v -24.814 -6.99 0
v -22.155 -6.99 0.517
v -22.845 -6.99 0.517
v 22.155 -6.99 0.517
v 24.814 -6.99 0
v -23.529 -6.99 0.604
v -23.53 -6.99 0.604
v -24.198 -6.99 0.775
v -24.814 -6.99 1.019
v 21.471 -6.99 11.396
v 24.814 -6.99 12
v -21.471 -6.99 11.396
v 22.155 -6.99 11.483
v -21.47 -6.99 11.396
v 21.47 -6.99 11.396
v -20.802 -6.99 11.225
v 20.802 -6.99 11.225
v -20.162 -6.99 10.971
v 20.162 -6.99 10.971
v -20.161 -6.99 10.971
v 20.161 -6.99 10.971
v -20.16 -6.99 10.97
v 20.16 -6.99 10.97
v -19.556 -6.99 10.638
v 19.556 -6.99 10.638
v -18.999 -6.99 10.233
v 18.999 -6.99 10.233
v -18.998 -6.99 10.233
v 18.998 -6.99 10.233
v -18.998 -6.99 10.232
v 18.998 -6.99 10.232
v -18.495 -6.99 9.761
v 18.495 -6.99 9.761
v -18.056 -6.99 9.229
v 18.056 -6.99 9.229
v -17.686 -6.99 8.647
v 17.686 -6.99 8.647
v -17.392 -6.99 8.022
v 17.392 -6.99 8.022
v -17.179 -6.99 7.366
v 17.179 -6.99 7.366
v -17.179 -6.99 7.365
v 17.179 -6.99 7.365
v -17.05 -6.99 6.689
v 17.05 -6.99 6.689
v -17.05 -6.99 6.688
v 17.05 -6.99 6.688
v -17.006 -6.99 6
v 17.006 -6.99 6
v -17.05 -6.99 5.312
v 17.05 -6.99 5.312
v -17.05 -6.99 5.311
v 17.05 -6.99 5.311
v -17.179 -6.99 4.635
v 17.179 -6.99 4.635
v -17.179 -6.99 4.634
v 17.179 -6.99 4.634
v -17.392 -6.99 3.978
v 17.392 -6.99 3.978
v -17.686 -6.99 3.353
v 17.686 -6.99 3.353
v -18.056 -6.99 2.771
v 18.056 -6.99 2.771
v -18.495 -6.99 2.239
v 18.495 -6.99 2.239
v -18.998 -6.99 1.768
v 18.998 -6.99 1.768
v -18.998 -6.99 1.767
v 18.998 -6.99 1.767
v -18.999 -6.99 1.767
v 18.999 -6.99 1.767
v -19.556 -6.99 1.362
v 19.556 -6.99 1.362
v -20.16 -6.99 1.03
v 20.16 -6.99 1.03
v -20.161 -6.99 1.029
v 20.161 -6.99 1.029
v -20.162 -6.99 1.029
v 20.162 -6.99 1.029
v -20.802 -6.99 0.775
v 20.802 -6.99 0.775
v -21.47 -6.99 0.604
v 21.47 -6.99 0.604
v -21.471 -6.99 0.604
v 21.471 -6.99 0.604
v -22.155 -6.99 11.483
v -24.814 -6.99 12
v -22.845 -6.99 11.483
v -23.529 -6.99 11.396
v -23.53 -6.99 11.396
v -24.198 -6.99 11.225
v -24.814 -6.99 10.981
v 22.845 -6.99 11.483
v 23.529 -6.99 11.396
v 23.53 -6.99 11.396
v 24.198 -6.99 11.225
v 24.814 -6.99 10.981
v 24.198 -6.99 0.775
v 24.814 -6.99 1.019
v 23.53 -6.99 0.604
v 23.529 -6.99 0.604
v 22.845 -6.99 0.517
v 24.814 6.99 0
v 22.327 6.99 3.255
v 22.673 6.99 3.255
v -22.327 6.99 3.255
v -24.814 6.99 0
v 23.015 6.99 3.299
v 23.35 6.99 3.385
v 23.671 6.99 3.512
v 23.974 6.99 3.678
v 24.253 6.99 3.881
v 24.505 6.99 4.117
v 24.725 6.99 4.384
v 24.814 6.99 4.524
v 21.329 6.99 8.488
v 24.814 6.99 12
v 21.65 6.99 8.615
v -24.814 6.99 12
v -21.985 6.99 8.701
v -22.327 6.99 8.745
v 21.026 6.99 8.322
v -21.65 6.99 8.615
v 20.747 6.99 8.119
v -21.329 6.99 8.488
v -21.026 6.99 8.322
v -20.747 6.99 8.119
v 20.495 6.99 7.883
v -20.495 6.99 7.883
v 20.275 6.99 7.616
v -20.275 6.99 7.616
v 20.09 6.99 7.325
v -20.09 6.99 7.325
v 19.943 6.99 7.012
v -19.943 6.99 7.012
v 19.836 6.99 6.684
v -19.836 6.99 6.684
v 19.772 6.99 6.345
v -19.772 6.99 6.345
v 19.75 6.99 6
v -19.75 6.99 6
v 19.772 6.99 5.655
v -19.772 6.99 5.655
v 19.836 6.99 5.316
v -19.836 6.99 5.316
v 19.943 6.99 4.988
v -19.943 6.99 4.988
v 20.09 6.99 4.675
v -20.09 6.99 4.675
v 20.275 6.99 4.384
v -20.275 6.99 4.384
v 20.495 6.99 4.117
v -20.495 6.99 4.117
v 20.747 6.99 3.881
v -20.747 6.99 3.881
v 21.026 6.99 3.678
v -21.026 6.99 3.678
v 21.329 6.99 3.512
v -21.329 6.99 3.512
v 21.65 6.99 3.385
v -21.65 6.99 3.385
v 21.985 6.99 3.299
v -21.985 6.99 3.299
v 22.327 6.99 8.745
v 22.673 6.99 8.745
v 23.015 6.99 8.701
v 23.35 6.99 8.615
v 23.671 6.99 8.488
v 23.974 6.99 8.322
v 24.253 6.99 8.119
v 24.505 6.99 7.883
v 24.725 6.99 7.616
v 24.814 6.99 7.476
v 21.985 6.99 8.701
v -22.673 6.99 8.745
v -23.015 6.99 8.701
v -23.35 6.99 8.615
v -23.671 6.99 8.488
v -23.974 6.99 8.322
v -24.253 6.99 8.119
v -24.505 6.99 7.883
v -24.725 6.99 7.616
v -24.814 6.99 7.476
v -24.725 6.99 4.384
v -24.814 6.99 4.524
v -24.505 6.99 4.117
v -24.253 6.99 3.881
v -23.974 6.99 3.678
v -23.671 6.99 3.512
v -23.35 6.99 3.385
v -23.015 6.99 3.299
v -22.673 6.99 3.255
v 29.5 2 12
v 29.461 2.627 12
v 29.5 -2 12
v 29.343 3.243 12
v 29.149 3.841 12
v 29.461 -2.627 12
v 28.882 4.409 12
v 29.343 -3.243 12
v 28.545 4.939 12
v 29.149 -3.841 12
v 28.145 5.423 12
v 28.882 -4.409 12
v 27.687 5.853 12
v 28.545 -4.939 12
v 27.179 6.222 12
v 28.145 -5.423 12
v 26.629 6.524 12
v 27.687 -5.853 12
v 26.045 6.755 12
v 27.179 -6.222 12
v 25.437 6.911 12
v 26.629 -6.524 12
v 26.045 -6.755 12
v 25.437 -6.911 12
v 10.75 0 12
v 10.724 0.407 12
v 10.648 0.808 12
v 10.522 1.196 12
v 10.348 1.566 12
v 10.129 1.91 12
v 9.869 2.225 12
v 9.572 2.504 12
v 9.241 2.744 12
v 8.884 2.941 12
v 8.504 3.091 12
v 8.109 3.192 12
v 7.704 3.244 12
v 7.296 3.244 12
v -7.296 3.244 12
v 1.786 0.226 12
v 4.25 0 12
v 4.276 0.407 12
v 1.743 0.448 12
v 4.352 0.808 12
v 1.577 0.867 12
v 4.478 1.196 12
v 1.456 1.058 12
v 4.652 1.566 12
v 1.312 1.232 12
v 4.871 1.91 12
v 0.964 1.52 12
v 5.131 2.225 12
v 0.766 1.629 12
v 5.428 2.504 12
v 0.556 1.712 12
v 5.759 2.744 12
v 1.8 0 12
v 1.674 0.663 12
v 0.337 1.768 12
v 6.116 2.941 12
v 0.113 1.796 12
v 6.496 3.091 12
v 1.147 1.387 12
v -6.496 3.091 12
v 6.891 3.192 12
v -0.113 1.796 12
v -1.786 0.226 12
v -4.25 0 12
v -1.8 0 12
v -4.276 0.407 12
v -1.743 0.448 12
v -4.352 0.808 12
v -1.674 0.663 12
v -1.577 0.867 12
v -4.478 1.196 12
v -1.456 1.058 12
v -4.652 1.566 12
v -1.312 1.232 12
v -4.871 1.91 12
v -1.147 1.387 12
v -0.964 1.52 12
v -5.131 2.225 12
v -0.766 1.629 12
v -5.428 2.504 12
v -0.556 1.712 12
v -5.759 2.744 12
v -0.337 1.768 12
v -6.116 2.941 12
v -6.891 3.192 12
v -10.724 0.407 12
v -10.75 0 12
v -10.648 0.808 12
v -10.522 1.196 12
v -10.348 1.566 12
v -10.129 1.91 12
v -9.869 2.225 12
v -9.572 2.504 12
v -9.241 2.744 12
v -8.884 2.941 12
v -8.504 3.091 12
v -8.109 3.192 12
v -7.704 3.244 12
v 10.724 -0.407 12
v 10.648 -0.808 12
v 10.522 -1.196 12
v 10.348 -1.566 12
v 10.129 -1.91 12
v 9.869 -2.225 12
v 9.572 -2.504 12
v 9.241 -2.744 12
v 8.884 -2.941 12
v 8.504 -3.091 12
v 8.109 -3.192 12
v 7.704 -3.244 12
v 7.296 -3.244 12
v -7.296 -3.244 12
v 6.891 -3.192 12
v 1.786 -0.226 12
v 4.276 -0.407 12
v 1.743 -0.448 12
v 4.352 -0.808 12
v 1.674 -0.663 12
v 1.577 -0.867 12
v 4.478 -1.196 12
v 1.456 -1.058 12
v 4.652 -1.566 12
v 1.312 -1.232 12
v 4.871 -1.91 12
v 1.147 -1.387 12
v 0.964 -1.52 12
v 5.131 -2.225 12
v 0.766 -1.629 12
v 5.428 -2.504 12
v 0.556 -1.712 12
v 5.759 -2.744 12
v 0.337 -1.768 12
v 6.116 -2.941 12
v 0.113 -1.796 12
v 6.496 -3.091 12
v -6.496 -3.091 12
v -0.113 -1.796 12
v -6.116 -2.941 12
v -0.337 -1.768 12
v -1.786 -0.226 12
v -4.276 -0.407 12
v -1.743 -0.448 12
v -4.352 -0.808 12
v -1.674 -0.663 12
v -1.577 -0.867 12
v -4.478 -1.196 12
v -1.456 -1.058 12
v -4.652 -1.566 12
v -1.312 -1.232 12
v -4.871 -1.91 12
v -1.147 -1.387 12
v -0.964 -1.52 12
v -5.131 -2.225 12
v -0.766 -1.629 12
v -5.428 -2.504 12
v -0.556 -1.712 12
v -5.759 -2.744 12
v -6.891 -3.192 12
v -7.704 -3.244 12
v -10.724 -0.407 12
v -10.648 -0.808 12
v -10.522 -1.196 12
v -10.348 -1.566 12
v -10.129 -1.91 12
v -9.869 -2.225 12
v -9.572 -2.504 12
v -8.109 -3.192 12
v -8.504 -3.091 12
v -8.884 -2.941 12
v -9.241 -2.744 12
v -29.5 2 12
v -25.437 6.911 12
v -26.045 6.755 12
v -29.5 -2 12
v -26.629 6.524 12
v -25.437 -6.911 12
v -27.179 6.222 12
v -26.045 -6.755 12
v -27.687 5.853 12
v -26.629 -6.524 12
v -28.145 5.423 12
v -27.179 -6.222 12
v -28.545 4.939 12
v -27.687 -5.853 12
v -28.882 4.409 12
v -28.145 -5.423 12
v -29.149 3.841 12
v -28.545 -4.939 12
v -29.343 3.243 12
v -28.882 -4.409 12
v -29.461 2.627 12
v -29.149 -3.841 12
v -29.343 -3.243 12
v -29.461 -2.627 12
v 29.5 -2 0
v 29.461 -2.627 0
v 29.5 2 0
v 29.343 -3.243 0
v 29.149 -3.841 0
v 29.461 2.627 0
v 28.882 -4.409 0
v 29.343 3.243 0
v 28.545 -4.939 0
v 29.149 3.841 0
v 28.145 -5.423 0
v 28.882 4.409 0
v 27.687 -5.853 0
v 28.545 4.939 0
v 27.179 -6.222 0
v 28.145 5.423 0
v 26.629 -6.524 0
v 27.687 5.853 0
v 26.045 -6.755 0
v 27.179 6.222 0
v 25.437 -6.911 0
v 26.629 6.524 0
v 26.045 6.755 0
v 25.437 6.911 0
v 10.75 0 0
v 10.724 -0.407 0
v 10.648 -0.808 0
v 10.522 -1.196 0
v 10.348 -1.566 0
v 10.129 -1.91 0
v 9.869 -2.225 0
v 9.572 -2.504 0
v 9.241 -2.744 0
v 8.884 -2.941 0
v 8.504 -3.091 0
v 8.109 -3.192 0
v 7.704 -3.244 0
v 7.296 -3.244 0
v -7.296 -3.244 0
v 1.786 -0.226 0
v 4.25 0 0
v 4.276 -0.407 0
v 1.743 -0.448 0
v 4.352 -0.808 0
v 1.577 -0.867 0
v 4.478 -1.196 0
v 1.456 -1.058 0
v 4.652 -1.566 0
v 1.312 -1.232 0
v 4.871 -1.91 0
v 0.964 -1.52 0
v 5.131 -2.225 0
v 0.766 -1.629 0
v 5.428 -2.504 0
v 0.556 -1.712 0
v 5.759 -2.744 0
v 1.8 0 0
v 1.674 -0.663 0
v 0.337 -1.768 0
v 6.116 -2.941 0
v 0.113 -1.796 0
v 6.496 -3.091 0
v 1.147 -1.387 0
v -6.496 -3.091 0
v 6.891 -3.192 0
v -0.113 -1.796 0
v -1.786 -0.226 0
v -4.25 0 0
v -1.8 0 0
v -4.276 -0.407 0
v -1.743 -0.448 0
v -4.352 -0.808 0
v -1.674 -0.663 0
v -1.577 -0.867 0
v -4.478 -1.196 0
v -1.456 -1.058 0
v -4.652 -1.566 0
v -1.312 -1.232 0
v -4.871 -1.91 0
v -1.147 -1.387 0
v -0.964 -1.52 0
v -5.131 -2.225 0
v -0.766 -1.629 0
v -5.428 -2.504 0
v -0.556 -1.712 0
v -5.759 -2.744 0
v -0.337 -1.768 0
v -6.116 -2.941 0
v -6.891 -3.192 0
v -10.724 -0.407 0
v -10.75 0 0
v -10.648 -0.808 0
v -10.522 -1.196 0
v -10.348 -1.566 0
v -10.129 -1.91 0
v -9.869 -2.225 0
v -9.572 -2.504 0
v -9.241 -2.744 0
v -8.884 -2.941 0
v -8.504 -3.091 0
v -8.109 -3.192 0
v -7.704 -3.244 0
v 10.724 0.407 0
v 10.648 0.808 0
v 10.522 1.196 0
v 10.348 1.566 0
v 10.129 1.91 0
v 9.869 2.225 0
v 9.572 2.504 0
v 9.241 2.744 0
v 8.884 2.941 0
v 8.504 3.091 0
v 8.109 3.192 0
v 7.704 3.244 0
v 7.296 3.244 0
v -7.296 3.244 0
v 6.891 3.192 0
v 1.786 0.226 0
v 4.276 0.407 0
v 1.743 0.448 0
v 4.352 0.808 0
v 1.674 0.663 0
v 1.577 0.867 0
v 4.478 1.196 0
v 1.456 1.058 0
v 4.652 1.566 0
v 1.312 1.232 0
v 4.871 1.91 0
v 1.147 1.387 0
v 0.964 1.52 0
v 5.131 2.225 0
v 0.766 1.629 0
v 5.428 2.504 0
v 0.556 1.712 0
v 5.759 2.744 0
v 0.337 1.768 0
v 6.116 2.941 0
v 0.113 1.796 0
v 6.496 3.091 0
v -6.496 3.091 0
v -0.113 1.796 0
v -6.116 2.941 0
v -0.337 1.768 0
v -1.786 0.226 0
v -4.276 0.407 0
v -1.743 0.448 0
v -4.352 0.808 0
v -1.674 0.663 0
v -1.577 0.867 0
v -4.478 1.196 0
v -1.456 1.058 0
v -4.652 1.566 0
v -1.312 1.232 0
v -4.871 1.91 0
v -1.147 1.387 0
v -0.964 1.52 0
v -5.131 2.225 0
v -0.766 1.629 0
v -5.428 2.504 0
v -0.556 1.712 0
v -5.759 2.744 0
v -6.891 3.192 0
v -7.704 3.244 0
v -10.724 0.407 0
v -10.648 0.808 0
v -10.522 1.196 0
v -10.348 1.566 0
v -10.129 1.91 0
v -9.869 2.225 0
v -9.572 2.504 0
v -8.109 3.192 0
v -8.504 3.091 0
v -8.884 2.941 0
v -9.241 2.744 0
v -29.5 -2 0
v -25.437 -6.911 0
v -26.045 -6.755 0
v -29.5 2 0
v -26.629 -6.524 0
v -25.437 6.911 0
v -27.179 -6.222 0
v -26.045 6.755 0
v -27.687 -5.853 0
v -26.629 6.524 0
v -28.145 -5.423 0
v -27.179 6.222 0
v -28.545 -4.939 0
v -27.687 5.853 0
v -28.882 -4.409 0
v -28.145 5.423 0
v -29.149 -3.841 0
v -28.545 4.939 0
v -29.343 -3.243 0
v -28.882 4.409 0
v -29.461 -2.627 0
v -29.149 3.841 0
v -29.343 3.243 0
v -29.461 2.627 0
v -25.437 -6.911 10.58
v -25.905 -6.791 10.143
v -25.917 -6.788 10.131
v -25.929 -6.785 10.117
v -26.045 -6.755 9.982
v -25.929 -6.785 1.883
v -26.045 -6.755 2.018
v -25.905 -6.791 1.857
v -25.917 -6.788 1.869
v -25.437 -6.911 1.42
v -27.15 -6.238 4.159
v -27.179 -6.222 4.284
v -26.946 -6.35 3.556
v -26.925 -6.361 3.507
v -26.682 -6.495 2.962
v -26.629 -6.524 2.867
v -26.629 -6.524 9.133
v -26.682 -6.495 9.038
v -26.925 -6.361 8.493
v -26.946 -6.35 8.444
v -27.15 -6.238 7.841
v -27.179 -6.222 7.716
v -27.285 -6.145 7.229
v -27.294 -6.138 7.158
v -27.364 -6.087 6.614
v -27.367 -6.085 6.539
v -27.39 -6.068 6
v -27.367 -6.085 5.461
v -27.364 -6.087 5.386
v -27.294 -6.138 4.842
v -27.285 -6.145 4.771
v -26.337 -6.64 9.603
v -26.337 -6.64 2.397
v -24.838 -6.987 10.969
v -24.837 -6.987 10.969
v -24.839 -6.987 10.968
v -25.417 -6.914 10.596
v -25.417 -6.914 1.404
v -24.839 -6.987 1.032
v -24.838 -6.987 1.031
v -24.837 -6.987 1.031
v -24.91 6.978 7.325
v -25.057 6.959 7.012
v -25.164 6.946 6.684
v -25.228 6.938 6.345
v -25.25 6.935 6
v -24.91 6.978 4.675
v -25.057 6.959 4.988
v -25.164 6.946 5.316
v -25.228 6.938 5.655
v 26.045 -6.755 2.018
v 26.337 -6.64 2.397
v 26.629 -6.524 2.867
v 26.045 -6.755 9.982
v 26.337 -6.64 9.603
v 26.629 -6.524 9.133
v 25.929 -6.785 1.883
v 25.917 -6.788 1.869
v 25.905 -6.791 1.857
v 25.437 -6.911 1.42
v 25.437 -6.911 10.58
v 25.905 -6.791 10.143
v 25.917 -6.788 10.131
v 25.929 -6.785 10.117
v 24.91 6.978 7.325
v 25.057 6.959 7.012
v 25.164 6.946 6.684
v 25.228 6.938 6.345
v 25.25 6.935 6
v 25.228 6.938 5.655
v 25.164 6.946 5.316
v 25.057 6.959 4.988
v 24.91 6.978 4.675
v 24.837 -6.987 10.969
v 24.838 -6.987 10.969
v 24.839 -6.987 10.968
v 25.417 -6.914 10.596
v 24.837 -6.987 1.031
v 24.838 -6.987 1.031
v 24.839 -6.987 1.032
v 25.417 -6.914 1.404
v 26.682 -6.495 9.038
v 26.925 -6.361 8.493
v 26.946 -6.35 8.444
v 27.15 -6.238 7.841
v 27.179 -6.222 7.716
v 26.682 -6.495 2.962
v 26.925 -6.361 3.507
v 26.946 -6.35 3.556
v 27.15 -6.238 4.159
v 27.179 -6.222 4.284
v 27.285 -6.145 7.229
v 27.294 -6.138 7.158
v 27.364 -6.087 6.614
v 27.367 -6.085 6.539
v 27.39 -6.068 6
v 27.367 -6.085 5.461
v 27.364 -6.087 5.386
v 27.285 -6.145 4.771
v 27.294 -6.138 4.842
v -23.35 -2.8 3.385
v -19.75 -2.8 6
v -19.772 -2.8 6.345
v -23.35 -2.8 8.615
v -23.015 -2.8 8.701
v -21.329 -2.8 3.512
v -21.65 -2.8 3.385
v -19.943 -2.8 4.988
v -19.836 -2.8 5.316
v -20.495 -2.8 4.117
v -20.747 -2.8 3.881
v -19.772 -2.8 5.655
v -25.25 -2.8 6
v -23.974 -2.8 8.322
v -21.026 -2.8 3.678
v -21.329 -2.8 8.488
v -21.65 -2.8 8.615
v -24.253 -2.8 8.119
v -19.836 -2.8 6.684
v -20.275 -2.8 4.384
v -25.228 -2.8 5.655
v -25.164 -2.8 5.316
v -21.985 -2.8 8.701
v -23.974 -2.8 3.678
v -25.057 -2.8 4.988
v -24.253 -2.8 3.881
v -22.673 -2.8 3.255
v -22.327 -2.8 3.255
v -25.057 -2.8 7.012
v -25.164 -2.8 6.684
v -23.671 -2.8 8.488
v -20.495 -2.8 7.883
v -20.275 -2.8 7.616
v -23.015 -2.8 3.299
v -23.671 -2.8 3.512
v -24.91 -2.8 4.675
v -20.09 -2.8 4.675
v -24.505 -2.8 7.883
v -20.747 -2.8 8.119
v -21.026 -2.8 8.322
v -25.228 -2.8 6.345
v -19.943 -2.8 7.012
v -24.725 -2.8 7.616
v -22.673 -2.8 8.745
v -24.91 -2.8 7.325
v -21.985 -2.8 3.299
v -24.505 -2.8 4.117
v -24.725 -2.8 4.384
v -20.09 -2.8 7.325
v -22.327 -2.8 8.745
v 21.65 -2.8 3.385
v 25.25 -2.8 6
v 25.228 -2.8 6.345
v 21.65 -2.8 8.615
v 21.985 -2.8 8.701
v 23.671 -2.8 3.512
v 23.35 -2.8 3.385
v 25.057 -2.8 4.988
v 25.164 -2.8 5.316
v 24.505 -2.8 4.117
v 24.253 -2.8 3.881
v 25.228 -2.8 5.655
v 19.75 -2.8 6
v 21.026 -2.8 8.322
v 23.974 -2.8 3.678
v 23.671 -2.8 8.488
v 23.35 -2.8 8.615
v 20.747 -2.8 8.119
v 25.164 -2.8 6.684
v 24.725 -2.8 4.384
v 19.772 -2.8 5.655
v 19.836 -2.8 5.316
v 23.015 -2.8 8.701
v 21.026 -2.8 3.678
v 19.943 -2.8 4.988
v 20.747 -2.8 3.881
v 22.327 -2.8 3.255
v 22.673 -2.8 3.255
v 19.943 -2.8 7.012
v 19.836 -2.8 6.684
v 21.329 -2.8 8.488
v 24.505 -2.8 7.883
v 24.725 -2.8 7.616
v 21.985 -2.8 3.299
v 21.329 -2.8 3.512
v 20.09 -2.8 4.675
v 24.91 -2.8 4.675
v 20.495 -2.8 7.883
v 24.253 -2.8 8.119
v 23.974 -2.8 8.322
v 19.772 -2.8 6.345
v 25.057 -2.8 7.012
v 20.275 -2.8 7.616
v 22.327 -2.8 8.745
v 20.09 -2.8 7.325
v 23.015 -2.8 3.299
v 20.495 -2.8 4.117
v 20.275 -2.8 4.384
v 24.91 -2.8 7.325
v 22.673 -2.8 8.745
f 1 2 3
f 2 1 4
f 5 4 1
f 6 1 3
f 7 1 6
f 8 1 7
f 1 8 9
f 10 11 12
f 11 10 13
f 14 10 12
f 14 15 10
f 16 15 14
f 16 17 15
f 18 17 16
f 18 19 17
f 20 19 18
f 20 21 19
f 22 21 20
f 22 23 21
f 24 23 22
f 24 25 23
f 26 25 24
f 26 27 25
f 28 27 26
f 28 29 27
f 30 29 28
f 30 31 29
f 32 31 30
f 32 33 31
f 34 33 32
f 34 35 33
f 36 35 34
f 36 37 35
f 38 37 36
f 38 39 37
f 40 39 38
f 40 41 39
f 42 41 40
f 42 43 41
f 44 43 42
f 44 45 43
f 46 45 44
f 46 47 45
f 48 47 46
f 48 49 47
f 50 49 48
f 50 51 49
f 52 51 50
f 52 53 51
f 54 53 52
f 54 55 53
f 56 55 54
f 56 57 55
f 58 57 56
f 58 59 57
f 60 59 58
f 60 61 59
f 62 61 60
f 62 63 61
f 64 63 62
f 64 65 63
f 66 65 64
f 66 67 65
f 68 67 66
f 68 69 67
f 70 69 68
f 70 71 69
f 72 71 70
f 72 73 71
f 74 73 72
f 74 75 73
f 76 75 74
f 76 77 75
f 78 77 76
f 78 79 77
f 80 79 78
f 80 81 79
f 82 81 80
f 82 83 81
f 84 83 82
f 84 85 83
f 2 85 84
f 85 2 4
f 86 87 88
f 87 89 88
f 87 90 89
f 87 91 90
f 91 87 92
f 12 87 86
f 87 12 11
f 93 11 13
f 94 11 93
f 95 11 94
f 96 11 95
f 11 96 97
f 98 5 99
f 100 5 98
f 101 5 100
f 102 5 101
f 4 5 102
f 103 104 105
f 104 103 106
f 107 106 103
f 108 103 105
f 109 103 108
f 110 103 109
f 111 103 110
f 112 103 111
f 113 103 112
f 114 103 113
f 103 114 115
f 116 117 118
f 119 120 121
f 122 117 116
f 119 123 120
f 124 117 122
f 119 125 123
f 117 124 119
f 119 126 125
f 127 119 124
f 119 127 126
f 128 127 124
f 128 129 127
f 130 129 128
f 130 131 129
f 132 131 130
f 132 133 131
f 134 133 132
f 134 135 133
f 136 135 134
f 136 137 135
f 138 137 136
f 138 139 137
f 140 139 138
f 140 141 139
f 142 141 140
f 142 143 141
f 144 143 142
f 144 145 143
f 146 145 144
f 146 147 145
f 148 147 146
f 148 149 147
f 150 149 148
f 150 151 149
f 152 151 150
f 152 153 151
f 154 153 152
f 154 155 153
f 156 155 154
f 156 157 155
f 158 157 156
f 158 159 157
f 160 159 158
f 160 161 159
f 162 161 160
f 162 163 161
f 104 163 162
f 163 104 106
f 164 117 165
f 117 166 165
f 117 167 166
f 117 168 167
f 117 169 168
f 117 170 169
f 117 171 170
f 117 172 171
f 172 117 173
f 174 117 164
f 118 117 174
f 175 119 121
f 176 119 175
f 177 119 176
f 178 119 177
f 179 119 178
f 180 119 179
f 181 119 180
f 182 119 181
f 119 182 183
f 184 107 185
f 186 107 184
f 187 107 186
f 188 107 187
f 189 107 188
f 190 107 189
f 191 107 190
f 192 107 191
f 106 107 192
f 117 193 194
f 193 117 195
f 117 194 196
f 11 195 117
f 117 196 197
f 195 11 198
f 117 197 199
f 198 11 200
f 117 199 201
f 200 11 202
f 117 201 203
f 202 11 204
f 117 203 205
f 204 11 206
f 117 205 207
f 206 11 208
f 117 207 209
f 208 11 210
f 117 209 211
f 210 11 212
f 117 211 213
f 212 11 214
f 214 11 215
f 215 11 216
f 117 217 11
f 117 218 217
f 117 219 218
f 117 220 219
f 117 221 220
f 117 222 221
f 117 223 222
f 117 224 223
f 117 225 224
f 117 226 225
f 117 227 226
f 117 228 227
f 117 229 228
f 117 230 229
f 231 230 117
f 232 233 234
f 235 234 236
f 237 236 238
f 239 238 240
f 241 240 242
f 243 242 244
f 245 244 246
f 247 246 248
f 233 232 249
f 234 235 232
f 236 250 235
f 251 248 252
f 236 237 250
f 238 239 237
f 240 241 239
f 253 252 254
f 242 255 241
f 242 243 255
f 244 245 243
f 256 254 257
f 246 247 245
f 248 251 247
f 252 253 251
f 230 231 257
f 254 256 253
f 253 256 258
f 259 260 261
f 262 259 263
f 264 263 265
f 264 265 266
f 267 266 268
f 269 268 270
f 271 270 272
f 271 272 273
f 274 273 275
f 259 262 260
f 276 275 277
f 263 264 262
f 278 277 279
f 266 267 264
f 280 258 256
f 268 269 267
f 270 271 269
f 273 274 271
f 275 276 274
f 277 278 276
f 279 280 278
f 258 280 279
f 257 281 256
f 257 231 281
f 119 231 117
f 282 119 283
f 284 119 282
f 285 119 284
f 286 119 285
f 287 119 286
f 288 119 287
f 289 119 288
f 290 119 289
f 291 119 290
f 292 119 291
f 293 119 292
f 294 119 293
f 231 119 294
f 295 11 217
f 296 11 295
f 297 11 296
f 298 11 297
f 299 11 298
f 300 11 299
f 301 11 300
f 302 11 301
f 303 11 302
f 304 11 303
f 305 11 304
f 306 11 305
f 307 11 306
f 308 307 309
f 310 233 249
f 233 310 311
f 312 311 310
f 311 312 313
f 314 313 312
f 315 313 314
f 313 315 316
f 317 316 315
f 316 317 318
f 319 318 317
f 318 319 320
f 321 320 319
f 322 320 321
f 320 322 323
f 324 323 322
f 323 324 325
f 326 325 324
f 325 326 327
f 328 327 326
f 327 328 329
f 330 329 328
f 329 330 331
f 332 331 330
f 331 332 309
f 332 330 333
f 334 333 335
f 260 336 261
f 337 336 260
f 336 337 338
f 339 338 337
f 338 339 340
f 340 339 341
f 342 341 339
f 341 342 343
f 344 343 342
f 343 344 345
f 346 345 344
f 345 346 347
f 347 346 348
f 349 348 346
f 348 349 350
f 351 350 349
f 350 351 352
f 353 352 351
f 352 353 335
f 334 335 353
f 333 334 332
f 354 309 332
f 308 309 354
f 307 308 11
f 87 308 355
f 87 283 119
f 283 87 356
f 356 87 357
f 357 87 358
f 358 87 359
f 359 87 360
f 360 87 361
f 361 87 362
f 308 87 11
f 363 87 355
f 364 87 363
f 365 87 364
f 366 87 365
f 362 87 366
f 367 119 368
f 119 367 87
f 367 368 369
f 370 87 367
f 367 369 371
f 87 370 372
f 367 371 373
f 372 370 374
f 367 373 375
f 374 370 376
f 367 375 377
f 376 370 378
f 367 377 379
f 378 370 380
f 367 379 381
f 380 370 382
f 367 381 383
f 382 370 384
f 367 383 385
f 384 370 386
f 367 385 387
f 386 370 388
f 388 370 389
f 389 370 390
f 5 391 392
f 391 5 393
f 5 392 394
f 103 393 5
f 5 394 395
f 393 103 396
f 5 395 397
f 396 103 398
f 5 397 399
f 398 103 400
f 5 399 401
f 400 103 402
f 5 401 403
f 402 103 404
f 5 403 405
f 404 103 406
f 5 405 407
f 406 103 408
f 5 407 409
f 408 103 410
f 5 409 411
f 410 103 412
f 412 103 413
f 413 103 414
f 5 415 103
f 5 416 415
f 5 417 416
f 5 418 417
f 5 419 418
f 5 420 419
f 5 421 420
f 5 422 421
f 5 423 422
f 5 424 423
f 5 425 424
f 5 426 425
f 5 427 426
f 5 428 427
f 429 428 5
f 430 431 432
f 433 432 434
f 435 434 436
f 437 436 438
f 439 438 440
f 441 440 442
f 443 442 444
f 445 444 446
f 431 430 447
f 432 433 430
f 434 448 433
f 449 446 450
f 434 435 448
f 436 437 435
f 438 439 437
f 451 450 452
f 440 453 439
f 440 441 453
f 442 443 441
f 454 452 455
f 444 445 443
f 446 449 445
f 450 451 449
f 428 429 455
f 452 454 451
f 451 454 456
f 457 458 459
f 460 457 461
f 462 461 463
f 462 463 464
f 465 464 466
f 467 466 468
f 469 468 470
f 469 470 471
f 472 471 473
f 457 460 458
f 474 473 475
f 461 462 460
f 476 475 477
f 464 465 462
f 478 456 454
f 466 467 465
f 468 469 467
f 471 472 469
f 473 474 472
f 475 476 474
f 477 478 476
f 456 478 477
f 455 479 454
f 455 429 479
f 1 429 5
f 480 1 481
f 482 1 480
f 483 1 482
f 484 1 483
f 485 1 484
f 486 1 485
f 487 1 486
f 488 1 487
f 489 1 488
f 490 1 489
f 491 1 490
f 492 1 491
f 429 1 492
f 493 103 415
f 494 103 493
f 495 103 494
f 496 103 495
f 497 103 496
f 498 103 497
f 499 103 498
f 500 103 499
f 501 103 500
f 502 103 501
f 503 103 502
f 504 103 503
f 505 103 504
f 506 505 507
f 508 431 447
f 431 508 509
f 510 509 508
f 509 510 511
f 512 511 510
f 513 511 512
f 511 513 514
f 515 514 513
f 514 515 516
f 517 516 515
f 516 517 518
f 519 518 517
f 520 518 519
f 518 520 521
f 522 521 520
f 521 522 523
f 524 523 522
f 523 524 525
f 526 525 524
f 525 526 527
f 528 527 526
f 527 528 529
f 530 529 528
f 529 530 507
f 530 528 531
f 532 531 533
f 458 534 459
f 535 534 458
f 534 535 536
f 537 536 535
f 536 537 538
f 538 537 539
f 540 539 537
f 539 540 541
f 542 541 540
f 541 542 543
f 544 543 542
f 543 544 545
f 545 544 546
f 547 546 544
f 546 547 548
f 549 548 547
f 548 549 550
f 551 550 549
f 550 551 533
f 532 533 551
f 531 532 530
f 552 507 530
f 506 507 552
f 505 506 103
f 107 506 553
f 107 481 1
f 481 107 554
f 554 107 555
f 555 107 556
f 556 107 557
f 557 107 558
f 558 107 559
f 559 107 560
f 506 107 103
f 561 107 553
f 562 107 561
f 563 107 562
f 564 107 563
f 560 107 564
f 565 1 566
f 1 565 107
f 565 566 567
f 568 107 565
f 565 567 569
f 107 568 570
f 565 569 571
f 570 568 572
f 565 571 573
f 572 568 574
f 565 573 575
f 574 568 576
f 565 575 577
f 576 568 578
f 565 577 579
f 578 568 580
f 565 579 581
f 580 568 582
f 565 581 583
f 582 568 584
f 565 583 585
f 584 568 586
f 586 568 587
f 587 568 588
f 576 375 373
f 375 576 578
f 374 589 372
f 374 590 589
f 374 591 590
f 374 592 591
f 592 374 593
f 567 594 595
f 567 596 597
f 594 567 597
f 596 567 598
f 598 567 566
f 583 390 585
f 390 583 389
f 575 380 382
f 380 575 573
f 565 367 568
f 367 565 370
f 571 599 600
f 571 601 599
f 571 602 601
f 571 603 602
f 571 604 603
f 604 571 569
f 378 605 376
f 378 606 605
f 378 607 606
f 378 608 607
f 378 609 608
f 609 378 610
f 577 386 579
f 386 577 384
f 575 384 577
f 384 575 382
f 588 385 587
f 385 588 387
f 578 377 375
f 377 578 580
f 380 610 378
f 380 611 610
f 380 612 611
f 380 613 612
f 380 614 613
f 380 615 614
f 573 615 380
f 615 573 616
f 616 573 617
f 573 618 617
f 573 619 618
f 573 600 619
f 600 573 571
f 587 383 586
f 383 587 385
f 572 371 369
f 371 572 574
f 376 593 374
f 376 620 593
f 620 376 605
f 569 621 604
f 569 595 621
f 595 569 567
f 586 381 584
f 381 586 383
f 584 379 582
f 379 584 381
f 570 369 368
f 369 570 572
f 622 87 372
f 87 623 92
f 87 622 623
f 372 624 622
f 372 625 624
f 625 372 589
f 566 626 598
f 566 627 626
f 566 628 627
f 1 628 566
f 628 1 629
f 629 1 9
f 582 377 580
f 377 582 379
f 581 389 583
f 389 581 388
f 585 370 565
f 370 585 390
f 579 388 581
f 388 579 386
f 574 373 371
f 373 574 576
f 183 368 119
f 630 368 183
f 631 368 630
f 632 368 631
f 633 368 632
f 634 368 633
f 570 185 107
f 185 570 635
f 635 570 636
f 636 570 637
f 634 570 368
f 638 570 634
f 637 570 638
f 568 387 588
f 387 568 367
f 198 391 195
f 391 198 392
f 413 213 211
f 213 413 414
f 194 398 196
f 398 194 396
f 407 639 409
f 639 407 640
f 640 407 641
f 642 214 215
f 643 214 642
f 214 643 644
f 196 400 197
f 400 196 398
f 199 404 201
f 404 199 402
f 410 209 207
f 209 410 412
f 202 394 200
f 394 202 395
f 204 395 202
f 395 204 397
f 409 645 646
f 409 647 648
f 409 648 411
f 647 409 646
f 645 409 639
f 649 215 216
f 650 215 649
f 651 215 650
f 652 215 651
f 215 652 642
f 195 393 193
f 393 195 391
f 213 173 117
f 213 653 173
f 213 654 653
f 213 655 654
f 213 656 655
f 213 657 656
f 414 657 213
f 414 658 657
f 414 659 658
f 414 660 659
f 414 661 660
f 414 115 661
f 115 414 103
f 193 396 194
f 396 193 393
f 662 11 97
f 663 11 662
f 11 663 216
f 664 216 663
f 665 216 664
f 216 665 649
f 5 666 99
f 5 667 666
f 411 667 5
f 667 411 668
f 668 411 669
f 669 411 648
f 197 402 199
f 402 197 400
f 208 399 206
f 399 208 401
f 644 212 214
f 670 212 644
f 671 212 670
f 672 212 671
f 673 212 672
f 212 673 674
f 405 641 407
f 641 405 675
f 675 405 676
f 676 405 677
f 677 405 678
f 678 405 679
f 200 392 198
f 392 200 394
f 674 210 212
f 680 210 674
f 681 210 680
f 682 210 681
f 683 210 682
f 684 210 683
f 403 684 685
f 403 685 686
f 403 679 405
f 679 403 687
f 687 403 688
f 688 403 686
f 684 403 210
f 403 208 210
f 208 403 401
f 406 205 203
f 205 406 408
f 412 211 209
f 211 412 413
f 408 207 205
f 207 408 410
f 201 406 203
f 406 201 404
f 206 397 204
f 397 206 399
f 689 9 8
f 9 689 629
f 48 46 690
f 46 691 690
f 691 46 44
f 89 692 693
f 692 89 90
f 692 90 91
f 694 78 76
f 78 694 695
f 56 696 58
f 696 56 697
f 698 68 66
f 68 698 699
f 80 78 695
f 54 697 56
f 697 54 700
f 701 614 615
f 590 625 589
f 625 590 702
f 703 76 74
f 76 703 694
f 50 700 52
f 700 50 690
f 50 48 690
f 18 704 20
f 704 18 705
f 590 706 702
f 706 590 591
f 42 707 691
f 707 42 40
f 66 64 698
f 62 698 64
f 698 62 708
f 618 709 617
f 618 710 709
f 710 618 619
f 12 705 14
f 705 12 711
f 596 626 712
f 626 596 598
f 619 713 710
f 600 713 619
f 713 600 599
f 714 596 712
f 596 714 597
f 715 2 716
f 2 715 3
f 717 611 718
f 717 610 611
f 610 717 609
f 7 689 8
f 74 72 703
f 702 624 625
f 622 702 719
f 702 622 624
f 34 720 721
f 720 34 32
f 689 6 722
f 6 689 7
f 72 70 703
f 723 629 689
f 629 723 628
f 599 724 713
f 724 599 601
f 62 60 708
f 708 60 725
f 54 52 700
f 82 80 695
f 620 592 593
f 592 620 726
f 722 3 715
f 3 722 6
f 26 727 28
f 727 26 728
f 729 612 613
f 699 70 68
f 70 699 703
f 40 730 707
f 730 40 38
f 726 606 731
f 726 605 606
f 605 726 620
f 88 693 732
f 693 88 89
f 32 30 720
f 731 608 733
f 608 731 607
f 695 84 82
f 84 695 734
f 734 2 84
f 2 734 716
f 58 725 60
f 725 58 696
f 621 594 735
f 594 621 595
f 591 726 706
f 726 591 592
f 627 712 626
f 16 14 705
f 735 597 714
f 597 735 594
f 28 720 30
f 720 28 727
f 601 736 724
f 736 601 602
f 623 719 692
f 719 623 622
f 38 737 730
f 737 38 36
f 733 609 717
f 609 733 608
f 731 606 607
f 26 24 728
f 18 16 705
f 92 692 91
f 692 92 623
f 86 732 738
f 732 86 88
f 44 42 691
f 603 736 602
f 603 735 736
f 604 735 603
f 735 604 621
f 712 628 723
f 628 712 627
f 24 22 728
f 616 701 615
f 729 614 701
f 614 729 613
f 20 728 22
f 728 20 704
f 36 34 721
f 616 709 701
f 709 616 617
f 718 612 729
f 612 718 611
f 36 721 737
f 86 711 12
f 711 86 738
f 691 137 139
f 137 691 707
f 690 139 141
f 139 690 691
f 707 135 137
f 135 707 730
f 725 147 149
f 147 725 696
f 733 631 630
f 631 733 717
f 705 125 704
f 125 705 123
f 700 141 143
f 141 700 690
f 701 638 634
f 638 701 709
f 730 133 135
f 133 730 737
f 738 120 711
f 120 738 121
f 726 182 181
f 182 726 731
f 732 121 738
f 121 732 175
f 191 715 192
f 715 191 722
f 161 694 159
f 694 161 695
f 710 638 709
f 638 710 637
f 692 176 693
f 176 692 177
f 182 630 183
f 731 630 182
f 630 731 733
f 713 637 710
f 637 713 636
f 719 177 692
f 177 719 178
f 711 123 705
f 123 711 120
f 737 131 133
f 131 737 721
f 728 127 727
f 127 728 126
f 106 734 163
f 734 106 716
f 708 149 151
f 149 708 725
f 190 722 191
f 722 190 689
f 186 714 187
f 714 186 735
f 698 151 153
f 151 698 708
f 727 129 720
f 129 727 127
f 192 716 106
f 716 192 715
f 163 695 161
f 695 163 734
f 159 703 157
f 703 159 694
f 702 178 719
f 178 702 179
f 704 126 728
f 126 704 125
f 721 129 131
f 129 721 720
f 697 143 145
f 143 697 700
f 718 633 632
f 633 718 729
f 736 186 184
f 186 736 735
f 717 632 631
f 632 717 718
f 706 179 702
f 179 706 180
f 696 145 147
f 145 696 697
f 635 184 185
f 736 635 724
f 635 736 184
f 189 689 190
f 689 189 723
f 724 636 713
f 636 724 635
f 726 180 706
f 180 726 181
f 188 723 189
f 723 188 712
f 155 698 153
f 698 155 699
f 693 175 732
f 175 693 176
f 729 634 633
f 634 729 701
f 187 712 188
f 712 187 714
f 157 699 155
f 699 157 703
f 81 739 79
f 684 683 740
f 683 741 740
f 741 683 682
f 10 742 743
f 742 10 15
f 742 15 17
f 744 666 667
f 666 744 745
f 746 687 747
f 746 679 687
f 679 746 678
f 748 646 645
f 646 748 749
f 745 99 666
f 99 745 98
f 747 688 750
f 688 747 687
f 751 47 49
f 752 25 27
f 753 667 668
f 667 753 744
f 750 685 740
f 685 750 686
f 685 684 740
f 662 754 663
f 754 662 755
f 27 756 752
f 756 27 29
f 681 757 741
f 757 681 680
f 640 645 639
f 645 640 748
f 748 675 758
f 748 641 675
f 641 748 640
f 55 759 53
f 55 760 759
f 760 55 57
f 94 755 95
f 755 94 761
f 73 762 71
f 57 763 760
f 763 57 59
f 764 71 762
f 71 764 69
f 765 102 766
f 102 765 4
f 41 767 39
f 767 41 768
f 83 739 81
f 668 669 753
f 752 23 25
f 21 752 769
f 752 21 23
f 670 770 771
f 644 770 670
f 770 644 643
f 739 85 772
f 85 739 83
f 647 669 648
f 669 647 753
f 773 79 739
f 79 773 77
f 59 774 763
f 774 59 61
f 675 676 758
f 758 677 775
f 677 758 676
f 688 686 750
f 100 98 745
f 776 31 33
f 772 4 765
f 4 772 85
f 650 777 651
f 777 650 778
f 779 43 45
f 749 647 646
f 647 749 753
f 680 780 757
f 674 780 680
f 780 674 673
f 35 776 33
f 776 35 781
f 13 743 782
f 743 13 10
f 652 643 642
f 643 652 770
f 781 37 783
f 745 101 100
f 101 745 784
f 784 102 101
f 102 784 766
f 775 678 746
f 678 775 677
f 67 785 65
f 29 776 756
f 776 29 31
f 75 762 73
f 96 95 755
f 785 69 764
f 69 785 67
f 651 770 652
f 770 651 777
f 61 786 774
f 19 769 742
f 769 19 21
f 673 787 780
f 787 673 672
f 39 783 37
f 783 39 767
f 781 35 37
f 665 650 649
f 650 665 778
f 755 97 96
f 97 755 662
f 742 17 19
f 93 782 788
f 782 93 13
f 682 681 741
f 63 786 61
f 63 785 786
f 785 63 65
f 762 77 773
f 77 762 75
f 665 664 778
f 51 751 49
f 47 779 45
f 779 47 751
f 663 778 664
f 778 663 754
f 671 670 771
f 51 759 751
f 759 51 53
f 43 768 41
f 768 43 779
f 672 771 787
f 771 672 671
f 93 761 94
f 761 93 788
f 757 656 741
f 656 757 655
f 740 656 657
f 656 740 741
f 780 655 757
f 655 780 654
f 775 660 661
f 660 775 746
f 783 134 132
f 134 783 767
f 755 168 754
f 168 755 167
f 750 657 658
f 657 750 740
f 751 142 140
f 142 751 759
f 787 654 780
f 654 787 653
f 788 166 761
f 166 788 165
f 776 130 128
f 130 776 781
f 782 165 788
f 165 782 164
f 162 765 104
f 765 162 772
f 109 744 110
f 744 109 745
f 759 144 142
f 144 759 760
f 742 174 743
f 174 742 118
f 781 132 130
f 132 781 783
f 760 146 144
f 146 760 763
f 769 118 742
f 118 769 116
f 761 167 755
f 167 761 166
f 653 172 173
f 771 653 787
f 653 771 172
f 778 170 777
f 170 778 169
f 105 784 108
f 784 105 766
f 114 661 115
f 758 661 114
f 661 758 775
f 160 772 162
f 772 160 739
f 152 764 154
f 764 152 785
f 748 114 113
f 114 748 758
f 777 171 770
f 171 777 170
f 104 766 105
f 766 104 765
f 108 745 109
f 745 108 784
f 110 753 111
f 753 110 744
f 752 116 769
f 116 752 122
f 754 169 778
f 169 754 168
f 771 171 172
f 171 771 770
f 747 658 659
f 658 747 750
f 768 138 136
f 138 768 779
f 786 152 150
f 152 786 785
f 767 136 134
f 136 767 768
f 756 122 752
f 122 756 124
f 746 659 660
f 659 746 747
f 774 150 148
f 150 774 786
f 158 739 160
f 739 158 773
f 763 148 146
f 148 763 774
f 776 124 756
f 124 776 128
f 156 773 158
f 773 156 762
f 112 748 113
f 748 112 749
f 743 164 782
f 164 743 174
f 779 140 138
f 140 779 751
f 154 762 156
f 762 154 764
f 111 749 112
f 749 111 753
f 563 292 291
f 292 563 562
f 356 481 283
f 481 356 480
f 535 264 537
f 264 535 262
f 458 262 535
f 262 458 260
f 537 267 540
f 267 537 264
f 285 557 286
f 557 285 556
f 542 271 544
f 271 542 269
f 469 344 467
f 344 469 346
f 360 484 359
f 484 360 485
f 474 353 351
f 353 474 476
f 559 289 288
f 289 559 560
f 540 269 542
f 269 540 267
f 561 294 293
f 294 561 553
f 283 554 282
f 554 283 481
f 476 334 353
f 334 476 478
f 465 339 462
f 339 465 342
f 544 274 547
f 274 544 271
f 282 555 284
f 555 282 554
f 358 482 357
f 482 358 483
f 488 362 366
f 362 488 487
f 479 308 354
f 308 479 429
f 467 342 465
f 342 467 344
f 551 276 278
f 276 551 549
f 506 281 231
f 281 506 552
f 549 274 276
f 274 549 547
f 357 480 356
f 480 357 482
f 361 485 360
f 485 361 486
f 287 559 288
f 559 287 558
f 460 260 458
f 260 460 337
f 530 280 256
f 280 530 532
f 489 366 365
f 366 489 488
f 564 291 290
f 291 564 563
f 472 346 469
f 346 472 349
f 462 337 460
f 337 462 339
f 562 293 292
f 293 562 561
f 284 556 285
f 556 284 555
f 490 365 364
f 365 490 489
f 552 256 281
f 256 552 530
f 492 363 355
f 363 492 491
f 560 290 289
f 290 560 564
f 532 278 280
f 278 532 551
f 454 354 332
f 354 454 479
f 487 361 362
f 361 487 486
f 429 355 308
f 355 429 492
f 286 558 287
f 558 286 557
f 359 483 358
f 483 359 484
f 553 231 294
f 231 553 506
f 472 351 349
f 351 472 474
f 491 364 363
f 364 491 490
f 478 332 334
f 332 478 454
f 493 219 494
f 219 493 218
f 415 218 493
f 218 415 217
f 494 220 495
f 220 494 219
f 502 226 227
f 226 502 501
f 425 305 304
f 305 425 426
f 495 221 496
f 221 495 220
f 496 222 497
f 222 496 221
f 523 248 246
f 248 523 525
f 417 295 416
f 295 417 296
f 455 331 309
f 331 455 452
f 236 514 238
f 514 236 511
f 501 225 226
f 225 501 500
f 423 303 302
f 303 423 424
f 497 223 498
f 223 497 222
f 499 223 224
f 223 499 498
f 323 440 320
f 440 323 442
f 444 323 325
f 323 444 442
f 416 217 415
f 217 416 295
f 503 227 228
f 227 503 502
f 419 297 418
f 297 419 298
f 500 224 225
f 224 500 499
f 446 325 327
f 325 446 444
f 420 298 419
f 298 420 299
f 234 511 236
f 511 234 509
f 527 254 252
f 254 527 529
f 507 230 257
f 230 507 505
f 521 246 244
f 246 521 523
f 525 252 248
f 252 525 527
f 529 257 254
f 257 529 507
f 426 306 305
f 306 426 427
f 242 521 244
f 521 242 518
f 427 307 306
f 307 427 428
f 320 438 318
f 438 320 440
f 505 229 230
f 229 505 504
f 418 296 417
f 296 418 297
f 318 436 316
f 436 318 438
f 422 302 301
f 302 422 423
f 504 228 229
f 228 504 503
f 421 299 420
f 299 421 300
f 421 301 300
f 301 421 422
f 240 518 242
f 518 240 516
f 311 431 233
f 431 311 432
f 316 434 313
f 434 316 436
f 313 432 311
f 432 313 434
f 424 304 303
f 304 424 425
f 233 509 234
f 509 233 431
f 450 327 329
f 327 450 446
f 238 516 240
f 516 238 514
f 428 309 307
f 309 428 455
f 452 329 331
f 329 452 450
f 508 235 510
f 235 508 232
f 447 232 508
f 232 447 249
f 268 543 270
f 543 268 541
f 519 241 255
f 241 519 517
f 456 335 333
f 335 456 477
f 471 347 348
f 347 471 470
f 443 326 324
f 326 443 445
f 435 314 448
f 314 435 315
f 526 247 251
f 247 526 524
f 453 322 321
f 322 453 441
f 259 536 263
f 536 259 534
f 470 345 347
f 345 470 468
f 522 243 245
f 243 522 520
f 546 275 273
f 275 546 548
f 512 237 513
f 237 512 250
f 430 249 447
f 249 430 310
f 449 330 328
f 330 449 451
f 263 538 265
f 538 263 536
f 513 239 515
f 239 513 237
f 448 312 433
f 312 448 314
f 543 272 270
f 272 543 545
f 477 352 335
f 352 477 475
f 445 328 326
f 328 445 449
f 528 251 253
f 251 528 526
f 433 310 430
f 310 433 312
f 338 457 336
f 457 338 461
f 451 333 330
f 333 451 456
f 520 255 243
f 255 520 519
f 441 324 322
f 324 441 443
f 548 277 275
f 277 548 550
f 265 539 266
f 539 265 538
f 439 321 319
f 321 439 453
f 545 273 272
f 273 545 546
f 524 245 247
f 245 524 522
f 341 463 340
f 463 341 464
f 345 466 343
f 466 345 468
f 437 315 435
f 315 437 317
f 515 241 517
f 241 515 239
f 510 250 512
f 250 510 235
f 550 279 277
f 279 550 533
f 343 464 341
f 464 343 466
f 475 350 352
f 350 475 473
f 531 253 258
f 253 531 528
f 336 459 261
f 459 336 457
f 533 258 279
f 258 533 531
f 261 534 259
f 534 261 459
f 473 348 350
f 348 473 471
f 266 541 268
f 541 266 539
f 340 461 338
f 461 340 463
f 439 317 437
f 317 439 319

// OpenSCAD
$fn = 50;


difference() {
	union() {
		hull() {
			translate(v = [-9.5000000000, 2.0000000000, 0]) {
				cylinder(h = 12, r = 5);
			}
			translate(v = [9.5000000000, 2.0000000000, 0]) {
				cylinder(h = 12, r = 5);
			}
			translate(v = [-9.5000000000, -2.0000000000, 0]) {
				cylinder(h = 12, r = 5);
			}
			translate(v = [9.5000000000, -2.0000000000, 0]) {
				cylinder(h = 12, r = 5);
			}
		}
		translate(v = [-15.0000000000, 0.0000000000, 0]) {
			hull() {
				translate(v = [-9.5000000000, 2.0000000000, 0]) {
					cylinder(h = 12, r = 5);
				}
				translate(v = [9.5000000000, 2.0000000000, 0]) {
					cylinder(h = 12, r = 5);
				}
				translate(v = [-9.5000000000, -2.0000000000, 0]) {
					cylinder(h = 12, r = 5);
				}
				translate(v = [9.5000000000, -2.0000000000, 0]) {
					cylinder(h = 12, r = 5);
				}
			}
		}
		translate(v = [-15.0000000000, 0.0000000000, 0]) {
			hull() {
				translate(v = [-9.5000000000, 2.0000000000, 0]) {
					cylinder(h = 12, r = 5);
				}
				translate(v = [9.5000000000, 2.0000000000, 0]) {
					cylinder(h = 12, r = 5);
				}
				translate(v = [-9.5000000000, -2.0000000000, 0]) {
					cylinder(h = 12, r = 5);
				}
				translate(v = [9.5000000000, -2.0000000000, 0]) {
					cylinder(h = 12, r = 5);
				}
			}
		}
		translate(v = [15.0000000000, 0.0000000000, 0]) {
			hull() {
				translate(v = [-9.5000000000, 2.0000000000, 0]) {
					cylinder(h = 12, r = 5);
				}
				translate(v = [9.5000000000, 2.0000000000, 0]) {
					cylinder(h = 12, r = 5);
				}
				translate(v = [-9.5000000000, -2.0000000000, 0]) {
					cylinder(h = 12, r = 5);
				}
				translate(v = [9.5000000000, -2.0000000000, 0]) {
					cylinder(h = 12, r = 5);
				}
			}
		}
		translate(v = [15.0000000000, 0.0000000000, 0]) {
			hull() {
				translate(v = [-9.5000000000, 2.0000000000, 0]) {
					cylinder(h = 12, r = 5);
				}
				translate(v = [9.5000000000, 2.0000000000, 0]) {
					cylinder(h = 12, r = 5);
				}
				translate(v = [-9.5000000000, -2.0000000000, 0]) {
					cylinder(h = 12, r = 5);
				}
				translate(v = [9.5000000000, -2.0000000000, 0]) {
					cylinder(h = 12, r = 5);
				}
			}
		}
	}
	union() {
		translate(v = [-22.5000000000, -7.0000000000, 6.0000000000]) {
			rotate(a = [90, 0, 0]) {
				difference() {
					union() {
						#translate(v = [0, 0, -14.0000000000]) {
							cylinder(h = 14, r = 2.2500000000);
						}
						#translate(v = [0, 0, -4.2000000000]) {
							cylinder(h = 4.2000000000, r1 = 2.7500000000, r2 = 5.5000000000);
						}
						#translate(v = [0, 0, -14.0000000000]) {
							cylinder(h = 14, r = 2.7500000000);
						}
						#translate(v = [0, 0, -14.0000000000]) {
							cylinder(h = 14, r = 2.2500000000);
						}
					}
					union();
				}
			}
		}
		translate(v = [22.5000000000, -7.0000000000, 6.0000000000]) {
			rotate(a = [90, 0, 0]) {
				difference() {
					union() {
						#translate(v = [0, 0, -14.0000000000]) {
							cylinder(h = 14, r = 2.2500000000);
						}
						#translate(v = [0, 0, -4.2000000000]) {
							cylinder(h = 4.2000000000, r1 = 2.7500000000, r2 = 5.5000000000);
						}
						#translate(v = [0, 0, -14.0000000000]) {
							cylinder(h = 14, r = 2.7500000000);
						}
						#translate(v = [0, 0, -14.0000000000]) {
							cylinder(h = 14, r = 2.2500000000);
						}
					}
					union();
				}
			}
		}
		translate(v = [-7.5000000000, 0.0000000000, 0]) {
			translate(v = [0, 0, -100]) {
				cylinder(h = 200, r = 3.2500000000);
			}
		}
		translate(v = [7.5000000000, 0.0000000000, 0]) {
			translate(v = [0, 0, -100]) {
				cylinder(h = 200, r = 3.2500000000);
			}
		}
		translate(v = [-7.5000000000, 0.0000000000, 0]) {
			translate(v = [0, 0, -100]) {
				cylinder(h = 200, r = 1.8000000000);
			}
		}
		translate(v = [0, 0, -100]) {
			cylinder(h = 200, r = 1.8000000000);
		}
		translate(v = [7.5000000000, 0.0000000000, 0]) {
			translate(v = [0, 0, -100]) {
				cylinder(h = 200, r = 1.8000000000);
			}
		}
	}
}
